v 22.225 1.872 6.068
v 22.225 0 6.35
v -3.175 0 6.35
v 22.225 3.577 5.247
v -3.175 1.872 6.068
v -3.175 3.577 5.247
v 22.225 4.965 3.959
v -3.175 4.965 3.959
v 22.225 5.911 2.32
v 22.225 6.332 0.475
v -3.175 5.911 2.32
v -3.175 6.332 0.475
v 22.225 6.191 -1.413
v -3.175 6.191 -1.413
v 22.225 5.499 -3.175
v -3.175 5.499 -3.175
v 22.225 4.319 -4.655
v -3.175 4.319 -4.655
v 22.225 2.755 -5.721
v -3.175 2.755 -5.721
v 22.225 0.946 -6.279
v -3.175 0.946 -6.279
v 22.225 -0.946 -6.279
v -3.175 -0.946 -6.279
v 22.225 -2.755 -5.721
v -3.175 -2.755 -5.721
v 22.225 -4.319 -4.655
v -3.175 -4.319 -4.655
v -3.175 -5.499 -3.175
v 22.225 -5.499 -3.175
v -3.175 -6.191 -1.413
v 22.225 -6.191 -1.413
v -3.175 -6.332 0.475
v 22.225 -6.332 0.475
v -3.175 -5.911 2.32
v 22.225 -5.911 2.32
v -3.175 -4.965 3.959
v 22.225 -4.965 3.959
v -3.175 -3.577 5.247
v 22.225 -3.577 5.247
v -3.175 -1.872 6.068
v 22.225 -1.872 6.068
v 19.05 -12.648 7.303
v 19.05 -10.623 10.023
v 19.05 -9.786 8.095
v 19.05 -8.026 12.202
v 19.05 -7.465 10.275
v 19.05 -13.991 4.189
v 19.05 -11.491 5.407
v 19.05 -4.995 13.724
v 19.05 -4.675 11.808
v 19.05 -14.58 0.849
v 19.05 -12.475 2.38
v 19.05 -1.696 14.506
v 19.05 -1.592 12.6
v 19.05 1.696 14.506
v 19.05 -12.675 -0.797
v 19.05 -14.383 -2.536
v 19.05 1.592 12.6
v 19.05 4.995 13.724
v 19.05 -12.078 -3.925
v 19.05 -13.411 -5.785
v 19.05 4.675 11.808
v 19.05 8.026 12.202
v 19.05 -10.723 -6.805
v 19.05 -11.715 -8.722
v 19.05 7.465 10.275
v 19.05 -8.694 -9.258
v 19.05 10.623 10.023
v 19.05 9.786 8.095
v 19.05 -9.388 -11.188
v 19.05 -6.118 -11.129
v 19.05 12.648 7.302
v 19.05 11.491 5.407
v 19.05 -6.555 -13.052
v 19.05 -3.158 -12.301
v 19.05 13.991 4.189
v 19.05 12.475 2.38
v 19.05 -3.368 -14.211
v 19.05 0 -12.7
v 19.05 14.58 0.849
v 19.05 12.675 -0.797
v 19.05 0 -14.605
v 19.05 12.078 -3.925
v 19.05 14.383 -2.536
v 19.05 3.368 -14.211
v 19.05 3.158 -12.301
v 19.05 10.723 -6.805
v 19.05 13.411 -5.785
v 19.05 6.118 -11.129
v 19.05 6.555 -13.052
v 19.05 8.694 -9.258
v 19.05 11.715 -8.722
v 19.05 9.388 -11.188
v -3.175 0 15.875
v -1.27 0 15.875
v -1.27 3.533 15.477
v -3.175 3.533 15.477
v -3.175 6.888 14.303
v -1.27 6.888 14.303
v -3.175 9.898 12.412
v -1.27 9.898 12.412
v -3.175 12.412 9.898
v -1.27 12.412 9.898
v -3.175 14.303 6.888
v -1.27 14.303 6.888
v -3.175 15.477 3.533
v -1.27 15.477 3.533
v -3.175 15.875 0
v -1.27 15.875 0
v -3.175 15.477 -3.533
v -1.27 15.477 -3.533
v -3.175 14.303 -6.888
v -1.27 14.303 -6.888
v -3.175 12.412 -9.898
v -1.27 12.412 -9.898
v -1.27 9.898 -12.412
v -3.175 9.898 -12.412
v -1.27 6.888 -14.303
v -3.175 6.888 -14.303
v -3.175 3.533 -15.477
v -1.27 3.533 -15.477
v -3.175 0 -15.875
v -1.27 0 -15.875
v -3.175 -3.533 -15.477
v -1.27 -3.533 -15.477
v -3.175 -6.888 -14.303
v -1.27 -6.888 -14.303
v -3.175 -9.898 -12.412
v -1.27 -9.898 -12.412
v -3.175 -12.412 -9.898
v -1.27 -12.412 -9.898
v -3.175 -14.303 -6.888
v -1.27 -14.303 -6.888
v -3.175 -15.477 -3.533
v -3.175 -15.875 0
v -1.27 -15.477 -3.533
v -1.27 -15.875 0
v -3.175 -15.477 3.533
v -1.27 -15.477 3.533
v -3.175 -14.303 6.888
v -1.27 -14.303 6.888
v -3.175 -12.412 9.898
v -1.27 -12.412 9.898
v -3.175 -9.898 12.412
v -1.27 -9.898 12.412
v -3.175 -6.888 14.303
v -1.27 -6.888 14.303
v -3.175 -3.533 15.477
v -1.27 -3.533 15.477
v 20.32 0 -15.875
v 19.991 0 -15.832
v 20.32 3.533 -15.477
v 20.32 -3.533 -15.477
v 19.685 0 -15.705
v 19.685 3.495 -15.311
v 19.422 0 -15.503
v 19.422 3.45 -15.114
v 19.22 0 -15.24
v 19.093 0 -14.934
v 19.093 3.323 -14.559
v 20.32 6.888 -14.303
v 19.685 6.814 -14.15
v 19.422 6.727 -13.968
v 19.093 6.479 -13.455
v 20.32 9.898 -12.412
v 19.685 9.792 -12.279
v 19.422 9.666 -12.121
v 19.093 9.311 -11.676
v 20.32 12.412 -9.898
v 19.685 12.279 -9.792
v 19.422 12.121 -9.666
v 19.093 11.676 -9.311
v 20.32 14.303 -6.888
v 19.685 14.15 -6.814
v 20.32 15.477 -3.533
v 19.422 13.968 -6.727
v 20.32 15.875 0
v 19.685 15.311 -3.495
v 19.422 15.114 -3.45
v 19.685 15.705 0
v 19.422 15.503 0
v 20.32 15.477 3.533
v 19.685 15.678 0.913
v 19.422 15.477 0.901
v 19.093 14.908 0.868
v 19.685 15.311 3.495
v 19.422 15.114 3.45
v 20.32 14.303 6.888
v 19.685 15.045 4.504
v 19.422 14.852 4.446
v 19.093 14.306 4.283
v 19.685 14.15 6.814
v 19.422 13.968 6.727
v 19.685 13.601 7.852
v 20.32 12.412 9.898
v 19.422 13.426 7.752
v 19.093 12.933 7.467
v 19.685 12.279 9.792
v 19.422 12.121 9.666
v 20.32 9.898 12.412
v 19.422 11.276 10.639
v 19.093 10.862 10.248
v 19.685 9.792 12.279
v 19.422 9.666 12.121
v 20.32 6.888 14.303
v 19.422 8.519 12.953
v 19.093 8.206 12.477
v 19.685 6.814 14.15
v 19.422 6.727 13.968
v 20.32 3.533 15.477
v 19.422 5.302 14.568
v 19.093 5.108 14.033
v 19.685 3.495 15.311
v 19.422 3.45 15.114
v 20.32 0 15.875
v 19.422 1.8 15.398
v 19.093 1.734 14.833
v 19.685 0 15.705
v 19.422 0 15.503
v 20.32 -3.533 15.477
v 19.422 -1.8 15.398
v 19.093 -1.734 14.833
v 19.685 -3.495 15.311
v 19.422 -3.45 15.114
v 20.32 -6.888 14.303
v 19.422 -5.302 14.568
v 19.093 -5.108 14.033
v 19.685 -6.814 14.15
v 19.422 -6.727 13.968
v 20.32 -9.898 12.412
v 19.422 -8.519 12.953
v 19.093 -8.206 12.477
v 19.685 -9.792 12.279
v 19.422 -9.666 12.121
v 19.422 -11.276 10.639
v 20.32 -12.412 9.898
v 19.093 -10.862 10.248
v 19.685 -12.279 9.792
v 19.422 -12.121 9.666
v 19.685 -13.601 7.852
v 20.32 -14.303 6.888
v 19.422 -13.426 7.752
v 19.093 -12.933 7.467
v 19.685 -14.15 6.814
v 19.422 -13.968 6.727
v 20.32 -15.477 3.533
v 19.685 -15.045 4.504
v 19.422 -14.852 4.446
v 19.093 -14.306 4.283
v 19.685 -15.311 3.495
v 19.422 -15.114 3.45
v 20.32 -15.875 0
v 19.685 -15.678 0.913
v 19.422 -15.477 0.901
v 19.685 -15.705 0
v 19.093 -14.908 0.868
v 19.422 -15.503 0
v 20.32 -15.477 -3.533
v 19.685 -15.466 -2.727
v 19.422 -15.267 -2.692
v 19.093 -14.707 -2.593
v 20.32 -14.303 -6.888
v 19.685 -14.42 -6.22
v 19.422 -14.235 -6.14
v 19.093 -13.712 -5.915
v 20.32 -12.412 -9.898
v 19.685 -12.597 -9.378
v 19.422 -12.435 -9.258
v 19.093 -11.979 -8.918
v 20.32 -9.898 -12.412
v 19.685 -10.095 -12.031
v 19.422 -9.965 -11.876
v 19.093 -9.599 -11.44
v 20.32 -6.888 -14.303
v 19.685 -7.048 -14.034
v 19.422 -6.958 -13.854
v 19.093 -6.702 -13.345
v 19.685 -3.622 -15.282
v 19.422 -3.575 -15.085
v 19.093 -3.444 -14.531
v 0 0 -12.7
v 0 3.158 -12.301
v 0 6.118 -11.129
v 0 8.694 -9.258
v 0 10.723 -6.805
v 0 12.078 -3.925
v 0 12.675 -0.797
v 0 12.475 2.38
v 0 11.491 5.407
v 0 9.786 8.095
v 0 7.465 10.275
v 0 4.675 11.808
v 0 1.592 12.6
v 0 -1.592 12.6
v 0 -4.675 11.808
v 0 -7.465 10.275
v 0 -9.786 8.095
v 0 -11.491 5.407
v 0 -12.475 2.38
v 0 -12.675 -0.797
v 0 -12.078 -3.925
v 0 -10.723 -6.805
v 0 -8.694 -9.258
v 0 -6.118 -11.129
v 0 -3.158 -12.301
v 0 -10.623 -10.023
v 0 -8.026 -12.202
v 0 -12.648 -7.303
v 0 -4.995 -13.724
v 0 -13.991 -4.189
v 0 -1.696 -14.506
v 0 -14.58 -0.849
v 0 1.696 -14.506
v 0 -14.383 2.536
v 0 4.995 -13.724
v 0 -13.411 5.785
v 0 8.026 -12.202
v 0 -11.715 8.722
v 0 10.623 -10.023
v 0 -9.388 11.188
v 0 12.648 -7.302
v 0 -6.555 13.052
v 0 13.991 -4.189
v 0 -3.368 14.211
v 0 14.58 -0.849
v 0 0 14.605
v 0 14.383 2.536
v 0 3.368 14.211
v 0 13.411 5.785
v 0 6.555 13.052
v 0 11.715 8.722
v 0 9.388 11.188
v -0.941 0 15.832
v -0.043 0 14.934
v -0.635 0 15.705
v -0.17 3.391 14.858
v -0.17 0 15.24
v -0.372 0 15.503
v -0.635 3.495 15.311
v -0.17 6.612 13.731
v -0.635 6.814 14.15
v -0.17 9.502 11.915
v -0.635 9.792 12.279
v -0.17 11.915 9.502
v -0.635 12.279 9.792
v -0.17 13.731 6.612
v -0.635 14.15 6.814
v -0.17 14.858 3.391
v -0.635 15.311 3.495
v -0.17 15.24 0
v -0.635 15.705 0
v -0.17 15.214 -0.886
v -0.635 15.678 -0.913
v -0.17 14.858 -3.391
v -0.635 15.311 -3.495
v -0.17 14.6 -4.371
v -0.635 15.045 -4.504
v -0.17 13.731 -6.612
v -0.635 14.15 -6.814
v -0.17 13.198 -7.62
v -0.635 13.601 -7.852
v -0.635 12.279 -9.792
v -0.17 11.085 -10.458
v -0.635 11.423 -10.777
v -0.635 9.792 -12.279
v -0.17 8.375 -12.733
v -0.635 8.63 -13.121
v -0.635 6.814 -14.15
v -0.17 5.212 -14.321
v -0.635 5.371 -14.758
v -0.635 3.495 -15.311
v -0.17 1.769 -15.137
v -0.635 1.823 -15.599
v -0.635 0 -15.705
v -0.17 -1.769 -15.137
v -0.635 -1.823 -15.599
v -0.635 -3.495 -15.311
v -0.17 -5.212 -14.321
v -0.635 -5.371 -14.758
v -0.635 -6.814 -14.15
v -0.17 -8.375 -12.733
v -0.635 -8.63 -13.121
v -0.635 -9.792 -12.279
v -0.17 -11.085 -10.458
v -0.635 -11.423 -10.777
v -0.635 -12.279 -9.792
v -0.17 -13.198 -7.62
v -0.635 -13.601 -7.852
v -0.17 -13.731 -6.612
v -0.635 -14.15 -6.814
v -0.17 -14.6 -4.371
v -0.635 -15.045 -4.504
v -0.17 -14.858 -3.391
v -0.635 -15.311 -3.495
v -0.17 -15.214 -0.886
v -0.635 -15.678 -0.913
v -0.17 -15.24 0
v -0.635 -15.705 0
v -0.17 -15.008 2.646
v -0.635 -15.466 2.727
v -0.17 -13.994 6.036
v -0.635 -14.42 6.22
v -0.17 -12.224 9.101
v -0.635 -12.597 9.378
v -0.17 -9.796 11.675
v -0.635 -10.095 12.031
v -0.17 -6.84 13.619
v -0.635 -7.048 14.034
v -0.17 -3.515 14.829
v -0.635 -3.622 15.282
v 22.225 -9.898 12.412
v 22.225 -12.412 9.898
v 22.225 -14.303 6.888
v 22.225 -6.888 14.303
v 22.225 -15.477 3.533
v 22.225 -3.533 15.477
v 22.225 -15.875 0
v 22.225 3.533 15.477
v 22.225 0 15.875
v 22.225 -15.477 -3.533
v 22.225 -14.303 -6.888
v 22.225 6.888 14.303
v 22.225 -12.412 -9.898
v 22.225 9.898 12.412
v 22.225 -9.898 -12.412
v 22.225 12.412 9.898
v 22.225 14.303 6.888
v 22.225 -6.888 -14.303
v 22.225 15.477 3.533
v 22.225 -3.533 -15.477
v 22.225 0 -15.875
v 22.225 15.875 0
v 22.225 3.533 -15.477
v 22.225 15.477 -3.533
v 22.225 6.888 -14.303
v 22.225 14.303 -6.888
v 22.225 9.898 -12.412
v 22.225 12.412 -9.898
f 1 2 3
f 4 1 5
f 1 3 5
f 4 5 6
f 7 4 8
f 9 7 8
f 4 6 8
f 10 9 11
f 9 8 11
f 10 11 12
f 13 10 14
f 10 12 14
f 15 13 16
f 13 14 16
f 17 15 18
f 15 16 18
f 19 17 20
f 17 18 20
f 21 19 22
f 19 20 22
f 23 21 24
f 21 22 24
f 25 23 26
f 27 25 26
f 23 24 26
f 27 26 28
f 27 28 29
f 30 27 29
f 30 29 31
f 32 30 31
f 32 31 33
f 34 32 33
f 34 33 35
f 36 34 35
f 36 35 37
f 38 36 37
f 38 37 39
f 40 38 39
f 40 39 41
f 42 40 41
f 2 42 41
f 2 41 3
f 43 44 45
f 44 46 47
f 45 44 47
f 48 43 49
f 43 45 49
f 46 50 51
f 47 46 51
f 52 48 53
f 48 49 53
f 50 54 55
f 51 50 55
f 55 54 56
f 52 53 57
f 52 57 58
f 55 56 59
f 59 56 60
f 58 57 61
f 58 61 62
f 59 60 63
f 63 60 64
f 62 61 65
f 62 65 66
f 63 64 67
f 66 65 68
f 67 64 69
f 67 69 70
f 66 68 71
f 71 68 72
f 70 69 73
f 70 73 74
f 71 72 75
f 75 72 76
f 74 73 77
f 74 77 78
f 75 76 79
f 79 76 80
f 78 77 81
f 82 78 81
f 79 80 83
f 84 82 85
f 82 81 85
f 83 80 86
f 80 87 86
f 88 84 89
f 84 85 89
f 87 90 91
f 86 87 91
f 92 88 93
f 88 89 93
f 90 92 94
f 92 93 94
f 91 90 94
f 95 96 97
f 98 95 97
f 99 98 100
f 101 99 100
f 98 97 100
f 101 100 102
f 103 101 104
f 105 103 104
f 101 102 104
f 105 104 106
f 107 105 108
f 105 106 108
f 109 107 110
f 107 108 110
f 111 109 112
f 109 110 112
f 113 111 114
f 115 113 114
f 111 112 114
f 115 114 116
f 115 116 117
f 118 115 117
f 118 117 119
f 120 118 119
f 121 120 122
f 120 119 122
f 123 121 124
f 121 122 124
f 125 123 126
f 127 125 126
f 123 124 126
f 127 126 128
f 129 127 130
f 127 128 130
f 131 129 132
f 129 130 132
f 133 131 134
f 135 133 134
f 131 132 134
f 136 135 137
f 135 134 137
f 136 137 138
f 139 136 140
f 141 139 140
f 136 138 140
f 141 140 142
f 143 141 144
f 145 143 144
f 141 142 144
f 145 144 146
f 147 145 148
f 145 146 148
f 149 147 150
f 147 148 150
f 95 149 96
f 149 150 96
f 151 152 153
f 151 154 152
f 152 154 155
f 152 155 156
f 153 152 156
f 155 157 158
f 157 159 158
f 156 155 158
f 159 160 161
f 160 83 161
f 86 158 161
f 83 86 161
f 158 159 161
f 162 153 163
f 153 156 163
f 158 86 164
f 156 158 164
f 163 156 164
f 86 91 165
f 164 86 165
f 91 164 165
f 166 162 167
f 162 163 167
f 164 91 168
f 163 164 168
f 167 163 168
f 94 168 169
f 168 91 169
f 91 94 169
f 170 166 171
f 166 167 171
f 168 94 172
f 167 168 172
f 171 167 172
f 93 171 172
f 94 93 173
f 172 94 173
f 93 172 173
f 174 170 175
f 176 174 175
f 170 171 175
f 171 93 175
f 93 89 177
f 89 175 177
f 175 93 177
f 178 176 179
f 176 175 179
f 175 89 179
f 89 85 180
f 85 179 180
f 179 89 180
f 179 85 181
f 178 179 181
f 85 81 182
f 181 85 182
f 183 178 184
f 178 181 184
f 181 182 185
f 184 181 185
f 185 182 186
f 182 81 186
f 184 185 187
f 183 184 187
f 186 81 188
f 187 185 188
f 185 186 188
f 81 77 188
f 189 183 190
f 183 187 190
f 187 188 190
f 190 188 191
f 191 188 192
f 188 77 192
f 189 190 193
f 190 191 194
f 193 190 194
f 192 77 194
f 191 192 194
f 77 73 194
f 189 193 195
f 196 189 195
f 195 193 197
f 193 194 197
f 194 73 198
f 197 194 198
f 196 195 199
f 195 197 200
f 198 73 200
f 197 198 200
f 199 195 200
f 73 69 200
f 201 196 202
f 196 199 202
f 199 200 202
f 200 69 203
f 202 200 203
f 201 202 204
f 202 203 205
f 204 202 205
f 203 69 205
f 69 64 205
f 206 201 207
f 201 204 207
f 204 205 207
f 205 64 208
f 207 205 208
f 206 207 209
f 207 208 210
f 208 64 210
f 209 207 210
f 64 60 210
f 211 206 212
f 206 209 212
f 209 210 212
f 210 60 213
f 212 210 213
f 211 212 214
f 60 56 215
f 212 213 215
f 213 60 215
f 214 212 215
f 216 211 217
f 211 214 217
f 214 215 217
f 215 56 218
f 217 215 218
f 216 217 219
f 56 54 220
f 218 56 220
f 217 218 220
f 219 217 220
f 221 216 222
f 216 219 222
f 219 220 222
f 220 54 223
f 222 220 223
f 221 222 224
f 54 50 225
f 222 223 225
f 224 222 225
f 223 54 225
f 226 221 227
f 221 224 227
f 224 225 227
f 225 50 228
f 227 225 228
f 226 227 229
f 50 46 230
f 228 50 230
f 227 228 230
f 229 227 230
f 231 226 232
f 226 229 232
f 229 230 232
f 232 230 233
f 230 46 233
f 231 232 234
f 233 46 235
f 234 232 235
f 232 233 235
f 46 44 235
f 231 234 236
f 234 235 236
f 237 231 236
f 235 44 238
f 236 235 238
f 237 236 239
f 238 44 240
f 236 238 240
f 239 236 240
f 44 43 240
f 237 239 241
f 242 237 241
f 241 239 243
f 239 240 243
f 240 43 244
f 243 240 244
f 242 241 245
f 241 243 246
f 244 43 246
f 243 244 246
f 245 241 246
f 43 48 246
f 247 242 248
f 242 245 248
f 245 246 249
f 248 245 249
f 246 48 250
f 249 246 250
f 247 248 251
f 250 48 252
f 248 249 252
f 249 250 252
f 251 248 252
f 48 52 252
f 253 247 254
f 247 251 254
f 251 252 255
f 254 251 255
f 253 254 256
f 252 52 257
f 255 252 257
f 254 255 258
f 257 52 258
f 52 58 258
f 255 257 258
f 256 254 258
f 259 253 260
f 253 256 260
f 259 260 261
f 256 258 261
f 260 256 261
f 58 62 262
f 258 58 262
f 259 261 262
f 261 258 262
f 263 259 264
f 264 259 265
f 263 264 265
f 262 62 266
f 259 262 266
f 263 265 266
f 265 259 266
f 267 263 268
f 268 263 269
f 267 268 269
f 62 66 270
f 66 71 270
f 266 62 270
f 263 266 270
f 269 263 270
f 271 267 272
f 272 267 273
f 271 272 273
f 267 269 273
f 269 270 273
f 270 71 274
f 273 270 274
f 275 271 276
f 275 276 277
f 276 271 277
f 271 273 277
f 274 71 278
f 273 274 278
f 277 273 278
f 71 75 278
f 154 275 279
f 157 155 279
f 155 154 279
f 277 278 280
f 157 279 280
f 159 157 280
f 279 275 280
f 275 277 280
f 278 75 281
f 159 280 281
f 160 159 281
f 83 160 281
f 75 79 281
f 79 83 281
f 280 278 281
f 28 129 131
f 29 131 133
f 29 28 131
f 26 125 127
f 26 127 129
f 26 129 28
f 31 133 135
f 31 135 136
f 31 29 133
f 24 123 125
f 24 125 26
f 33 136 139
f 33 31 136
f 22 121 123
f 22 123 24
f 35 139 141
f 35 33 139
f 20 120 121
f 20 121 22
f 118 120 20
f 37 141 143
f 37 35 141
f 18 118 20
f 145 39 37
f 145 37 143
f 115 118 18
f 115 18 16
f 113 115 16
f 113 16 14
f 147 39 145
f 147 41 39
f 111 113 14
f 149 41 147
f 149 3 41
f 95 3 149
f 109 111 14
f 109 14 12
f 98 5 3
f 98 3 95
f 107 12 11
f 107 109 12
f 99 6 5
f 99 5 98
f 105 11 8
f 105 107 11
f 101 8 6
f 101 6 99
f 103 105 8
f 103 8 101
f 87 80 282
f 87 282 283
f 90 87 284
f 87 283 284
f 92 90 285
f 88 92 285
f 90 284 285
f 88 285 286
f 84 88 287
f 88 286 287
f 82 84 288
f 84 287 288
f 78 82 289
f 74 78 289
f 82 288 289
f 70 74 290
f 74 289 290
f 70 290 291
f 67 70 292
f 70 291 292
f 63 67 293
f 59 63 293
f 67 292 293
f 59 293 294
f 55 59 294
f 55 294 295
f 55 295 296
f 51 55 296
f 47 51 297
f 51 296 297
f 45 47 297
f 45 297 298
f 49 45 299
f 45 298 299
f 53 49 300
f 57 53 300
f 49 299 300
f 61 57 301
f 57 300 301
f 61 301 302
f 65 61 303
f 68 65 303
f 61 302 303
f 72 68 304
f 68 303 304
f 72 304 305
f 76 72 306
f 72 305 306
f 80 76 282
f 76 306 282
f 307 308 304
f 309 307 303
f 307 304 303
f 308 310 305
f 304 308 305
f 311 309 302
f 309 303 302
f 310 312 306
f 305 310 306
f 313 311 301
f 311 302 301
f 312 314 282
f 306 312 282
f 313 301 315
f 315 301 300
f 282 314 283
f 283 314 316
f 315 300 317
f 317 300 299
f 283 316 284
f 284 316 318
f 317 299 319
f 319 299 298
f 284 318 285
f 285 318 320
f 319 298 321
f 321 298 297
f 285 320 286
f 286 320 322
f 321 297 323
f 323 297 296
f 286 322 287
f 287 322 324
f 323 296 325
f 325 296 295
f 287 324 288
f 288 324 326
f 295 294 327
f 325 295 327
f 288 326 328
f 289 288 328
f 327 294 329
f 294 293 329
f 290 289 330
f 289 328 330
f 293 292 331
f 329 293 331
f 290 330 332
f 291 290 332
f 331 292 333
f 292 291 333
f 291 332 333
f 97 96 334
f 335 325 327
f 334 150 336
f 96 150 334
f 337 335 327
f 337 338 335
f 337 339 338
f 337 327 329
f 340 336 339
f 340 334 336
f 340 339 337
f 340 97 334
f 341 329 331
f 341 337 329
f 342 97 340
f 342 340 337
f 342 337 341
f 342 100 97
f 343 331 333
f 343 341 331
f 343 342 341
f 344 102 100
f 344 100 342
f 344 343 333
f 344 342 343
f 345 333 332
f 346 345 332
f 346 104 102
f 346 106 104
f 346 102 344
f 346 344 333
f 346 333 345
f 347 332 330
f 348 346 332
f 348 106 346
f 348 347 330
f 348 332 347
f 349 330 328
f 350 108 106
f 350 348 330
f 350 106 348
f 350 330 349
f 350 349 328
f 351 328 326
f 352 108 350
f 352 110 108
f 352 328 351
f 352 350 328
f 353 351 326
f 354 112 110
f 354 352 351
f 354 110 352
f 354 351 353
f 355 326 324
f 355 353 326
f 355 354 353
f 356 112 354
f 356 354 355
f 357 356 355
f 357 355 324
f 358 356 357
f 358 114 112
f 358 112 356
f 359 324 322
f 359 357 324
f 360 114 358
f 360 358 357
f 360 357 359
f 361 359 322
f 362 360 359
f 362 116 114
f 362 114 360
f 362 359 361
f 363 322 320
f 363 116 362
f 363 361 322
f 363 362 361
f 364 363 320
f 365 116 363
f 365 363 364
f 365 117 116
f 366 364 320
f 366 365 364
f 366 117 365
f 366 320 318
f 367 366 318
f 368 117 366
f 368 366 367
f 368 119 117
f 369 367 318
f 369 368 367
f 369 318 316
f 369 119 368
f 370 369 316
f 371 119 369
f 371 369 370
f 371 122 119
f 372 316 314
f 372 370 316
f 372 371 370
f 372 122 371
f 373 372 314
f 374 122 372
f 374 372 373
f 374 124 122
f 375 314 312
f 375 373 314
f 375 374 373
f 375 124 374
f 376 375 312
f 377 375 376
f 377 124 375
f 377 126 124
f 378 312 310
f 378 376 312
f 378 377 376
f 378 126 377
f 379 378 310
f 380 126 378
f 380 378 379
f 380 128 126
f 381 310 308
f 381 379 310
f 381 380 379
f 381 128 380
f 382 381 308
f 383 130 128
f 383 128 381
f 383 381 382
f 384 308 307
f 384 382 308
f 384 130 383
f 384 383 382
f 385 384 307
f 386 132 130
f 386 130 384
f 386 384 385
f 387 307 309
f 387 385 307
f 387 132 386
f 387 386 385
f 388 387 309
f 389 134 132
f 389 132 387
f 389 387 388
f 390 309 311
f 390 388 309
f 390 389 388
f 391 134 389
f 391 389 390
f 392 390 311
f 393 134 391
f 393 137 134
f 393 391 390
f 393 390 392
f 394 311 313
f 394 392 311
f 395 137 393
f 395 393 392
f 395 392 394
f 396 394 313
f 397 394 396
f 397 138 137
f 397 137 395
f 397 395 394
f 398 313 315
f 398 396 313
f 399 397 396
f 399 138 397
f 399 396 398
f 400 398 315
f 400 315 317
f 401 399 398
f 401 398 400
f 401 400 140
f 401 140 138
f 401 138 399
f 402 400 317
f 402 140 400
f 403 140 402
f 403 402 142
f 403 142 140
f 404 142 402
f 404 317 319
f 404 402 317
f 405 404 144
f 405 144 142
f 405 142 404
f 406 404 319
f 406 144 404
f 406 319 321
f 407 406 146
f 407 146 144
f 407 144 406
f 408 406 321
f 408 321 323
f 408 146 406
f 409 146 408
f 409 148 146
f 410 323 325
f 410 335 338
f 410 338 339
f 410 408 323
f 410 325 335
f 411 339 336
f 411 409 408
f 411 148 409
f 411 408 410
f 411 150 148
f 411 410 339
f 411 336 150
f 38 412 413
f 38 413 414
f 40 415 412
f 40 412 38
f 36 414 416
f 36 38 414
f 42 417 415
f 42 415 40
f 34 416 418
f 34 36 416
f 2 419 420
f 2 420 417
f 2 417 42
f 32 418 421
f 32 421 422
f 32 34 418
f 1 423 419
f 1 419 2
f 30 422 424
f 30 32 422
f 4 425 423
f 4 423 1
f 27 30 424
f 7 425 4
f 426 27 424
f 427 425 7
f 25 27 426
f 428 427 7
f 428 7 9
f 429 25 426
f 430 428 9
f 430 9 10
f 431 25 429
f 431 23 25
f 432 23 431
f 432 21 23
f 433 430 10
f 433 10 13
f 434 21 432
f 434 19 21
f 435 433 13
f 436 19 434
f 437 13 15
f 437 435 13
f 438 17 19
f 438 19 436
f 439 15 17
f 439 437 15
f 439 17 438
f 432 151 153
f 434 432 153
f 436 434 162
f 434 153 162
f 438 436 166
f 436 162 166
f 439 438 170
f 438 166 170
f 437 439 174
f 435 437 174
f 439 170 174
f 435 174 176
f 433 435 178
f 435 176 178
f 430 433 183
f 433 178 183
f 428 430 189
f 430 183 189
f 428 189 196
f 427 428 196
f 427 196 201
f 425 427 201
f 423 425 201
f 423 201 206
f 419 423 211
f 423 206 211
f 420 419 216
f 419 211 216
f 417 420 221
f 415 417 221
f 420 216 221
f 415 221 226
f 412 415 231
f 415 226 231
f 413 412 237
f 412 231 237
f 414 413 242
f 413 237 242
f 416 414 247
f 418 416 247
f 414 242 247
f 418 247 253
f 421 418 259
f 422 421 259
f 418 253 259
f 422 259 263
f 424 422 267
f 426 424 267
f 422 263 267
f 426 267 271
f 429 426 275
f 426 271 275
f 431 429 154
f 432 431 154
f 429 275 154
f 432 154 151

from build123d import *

# Parameters (mm, degrees)
SKETCH1_R           = 12.7
BOSS_EXTRUDE1_DEPTH = 19.05
SKETCH2_R           = 15.875
BOSS_EXTRUDE2_DEPTH = 3.175
SKETCH3_R           = 15.875
BOSS_EXTRUDE3_DEPTH = 3.175
SKETCH4_R           = 6.35
CUT_EXTRUDE1_DEPTH  = 26.4
FILLET1_R           = 1.27


with BuildPart() as part:
    # Sketch1 → Boss-Extrude1 (new body)
    with BuildSketch(Plane(origin=(0, 0, 0), x_dir=(0, 0, -1), z_dir=(1, 0, 0))):
        Circle(SKETCH1_R)
    extrude(amount=BOSS_EXTRUDE1_DEPTH)

    # Sketch2 → Boss-Extrude2 (add)
    with BuildSketch(Plane.ZY):
        Circle(SKETCH2_R)
    extrude(amount=BOSS_EXTRUDE2_DEPTH)

    # Sketch3 → Boss-Extrude3 (add)
    with BuildSketch(Plane(origin=(19.05, 0, 0), x_dir=(0, 0, -1), z_dir=(1, 0, 0))):
        Circle(SKETCH3_R)
    extrude(amount=BOSS_EXTRUDE3_DEPTH)

    # Sketch4 → Cut-Extrude1 (cut, through all)
    with BuildSketch(Plane.ZY.offset(3.175)):
        Circle(SKETCH4_R)
    extrude(amount=-CUT_EXTRUDE1_DEPTH, mode=Mode.SUBTRACT)

    # Fillet1
    fillet1_edges = [part.edges().sort_by_distance(p)[0] for p in [
        (0, 0, -15.875),
        (19.05, 0, 15.875),
    ]]
    fillet(fillet1_edges, radius=FILLET1_R)


solid = part.part
